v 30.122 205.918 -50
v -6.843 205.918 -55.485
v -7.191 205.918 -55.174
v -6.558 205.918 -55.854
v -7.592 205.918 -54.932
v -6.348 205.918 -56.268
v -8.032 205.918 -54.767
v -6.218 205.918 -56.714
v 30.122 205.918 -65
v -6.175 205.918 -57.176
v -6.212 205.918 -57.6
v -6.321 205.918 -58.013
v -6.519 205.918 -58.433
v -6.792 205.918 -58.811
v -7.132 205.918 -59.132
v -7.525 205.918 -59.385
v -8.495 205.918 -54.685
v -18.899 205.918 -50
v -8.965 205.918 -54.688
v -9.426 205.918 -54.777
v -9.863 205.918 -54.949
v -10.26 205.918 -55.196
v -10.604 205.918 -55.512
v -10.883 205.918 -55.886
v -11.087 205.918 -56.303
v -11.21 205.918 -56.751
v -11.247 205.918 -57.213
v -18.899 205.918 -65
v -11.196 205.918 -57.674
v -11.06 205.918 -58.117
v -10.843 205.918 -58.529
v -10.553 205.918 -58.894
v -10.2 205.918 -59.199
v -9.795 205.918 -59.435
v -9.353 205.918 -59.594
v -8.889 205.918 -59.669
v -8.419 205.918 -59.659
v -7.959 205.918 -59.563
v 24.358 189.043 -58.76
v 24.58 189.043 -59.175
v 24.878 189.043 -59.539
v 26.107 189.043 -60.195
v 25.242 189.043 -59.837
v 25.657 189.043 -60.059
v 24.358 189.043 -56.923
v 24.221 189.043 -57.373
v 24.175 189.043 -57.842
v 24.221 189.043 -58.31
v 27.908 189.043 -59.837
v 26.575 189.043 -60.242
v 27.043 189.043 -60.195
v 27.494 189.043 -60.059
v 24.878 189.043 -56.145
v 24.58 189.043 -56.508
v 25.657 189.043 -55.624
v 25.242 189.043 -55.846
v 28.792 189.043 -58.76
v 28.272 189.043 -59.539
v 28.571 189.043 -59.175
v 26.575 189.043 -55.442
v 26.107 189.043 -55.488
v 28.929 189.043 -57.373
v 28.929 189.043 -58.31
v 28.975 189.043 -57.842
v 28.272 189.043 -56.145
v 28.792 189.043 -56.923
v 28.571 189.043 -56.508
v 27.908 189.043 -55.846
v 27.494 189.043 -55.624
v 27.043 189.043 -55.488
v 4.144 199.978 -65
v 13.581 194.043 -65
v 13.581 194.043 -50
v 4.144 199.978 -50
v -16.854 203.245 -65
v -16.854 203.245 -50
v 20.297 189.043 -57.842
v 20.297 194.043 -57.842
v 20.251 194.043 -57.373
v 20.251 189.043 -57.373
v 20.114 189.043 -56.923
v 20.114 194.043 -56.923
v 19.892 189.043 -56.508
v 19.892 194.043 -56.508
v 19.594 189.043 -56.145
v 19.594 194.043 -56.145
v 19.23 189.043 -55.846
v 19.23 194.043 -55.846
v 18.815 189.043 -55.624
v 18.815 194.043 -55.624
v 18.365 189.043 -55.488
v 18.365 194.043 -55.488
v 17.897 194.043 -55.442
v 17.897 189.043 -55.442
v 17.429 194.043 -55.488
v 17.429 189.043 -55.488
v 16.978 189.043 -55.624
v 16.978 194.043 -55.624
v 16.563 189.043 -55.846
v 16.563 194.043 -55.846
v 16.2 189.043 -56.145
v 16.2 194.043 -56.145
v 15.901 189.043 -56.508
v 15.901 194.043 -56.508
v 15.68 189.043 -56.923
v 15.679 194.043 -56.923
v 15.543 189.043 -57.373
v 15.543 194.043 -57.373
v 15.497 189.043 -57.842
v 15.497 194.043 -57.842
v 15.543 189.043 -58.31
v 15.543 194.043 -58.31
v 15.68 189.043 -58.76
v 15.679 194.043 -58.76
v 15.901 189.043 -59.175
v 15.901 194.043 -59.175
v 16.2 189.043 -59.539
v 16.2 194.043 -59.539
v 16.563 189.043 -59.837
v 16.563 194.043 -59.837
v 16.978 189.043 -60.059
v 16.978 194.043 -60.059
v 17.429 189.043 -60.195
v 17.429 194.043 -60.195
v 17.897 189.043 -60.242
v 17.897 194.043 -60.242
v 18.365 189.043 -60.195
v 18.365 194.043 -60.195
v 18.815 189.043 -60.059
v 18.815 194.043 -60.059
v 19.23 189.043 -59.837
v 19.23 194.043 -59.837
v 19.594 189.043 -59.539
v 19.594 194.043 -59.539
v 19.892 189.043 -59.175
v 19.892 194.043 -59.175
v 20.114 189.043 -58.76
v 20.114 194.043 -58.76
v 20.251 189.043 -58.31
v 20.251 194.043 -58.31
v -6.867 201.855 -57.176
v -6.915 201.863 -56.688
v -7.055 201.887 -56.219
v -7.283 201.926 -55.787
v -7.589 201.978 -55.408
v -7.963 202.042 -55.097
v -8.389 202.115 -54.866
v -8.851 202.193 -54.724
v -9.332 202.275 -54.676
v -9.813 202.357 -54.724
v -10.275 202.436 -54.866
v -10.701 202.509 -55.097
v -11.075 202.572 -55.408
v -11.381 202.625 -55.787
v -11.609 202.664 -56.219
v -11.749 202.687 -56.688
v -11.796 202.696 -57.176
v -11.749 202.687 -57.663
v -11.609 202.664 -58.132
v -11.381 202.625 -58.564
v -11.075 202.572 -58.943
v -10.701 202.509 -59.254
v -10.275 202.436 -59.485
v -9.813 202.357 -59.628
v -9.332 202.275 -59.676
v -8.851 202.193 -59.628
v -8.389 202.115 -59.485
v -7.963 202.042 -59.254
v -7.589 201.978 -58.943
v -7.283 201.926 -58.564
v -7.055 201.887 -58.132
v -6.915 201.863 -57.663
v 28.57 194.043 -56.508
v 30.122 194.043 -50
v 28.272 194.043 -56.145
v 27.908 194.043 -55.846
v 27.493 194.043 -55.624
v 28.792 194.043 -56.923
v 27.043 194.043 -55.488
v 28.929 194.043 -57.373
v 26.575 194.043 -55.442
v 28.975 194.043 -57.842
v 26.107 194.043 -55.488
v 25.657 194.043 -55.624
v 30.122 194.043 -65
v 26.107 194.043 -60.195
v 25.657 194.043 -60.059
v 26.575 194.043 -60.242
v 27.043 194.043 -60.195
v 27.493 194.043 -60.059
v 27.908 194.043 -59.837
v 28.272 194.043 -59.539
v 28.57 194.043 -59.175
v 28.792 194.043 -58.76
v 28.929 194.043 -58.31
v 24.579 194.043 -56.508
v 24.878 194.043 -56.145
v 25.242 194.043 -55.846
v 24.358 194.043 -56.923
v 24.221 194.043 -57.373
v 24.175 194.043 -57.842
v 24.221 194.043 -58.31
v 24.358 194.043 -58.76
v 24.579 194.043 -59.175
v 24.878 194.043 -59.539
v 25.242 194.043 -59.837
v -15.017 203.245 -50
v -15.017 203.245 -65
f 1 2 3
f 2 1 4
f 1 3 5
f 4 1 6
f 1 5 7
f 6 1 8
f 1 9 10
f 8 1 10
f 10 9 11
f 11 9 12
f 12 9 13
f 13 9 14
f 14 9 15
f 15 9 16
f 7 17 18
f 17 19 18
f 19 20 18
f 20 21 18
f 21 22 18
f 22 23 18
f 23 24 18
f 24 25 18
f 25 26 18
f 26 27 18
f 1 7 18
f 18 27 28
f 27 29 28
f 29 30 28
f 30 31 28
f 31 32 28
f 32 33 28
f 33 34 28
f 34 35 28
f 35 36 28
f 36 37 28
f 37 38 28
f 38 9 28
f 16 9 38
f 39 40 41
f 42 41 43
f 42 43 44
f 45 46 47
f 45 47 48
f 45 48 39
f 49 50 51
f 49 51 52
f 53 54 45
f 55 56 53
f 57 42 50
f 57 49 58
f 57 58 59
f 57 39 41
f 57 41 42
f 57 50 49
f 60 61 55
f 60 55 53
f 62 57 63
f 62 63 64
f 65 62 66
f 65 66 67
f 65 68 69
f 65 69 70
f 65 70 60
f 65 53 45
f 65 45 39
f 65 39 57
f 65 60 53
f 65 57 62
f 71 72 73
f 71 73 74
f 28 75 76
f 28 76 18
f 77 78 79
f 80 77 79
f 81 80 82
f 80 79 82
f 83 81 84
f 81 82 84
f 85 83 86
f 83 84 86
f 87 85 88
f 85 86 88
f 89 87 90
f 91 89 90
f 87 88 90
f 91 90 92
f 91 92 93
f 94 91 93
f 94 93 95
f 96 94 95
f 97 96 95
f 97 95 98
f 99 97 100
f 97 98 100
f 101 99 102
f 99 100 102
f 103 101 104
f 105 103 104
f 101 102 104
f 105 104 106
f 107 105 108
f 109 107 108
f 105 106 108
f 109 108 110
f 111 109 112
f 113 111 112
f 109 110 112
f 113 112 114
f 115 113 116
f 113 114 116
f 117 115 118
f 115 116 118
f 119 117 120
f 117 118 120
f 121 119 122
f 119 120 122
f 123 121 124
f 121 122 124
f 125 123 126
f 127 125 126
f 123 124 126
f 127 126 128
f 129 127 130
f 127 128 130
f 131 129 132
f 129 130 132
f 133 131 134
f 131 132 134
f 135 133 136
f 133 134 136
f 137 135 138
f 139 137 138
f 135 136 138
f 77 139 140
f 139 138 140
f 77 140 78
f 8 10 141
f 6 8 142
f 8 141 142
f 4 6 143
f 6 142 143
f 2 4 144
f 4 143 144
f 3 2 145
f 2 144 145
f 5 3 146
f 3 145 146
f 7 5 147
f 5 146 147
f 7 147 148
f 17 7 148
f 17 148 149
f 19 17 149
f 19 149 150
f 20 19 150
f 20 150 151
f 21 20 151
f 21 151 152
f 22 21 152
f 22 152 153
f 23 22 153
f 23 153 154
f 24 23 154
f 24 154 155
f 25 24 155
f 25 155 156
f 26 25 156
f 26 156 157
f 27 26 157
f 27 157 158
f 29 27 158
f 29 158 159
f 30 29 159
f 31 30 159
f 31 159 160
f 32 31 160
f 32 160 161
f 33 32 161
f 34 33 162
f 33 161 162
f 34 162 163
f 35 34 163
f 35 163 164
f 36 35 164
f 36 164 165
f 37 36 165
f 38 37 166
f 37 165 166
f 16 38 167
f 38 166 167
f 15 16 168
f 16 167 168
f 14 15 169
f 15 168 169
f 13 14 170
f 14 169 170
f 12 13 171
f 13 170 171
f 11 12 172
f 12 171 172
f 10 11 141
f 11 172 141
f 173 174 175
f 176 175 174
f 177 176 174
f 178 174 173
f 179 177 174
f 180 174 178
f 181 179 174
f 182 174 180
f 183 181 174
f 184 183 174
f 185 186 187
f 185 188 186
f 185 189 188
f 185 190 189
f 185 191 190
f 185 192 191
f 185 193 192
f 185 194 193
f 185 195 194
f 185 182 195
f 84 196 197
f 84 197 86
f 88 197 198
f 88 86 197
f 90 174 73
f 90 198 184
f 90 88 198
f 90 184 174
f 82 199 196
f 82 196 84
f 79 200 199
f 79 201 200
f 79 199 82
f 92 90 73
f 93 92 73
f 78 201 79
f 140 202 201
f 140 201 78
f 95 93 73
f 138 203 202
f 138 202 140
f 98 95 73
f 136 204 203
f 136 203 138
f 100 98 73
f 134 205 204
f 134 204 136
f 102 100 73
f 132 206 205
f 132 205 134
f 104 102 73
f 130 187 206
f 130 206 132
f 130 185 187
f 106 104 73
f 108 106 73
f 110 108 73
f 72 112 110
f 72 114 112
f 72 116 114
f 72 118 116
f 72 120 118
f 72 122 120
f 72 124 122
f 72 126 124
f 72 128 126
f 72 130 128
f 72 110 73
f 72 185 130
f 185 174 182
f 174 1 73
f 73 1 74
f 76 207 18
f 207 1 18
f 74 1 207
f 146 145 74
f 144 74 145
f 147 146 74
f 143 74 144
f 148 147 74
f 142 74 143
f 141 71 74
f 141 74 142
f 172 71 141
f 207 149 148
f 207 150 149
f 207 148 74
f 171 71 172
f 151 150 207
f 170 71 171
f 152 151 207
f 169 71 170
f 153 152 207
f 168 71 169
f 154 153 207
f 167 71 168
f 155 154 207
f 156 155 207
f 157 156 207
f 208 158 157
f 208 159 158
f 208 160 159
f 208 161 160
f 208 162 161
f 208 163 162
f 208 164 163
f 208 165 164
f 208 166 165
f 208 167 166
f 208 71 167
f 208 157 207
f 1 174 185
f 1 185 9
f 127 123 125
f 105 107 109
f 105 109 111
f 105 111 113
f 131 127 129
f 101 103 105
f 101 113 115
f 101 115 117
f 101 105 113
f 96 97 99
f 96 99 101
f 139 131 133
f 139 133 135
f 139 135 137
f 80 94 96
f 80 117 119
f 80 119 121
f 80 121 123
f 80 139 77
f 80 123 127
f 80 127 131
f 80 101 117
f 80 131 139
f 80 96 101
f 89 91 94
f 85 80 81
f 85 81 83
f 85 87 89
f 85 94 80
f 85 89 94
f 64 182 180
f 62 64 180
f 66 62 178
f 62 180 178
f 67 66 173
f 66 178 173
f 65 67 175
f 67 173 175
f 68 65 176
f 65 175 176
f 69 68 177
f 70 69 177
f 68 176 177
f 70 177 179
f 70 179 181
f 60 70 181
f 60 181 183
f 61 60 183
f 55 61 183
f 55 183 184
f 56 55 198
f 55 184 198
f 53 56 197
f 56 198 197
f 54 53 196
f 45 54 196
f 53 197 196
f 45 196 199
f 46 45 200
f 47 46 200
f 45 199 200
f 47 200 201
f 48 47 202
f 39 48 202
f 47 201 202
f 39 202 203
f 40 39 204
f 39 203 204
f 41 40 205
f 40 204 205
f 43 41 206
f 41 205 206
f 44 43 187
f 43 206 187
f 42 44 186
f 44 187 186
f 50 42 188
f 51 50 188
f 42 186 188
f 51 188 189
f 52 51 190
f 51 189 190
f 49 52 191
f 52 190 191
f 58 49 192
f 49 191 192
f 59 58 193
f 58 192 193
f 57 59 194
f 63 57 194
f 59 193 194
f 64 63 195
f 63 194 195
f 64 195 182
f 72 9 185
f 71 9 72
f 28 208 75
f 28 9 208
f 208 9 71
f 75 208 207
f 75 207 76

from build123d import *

# Parameters (mm, degrees)
PAD041_DEPTH    = 15
SKETCH095_R     = 2.5
POCKET045_DEPTH = 5
SKETCH096_R     = 2.4
PAD042_DEPTH    = 5


with BuildPart() as part:
    # Sketch094 → Pad041 (new body)
    with BuildSketch(Plane.XY):
        Polygon((30.122286, 194.043034), (13.580843, 194.042587), (4.144071, 199.977952), (-15.017249, 203.244653), (-16.854137, 203.244653), (-18.898529, 205.918312), (4.128235, 205.918312), (30.122286, 205.918312), (30.122286, 199.855942), align=None)
    extrude(amount=PAD041_DEPTH)

    # Sketch095 (on Face3 of Pad041) → Pocket045 (cut)
    with BuildSketch(Plane(origin=(33.2471900087, 195.0163320297, 0), x_dir=(0.9857768846, -0.1680593161, 0), z_dir=(-0.1680593161, -0.9857768846, 0))):
        with Locations((-43.193441, 7.824432)):
            Circle(SKETCH095_R)
    extrude(amount=-POCKET045_DEPTH, mode=Mode.SUBTRACT)

    # Sketch096 (on Face1 of Pocket045) → Pad042 (join)
    with BuildSketch(Plane(origin=(-0.0052436098, 194.0422198627, 0), x_dir=(0.9999999996, 2.7023e-05, 0), z_dir=(2.7023e-05, -0.9999999996, 0))):
        with Locations((17.901974, 7.158432)):
            Circle(SKETCH096_R)
        with Locations((26.5802, 7.158432)):
            Circle(SKETCH096_R)
    extrude(amount=PAD042_DEPTH)


with BuildPart() as part_1:
    # Body012 placement: moved
    add(part.part.moved(Location((0, 0, -65))))


solid = part_1.part
